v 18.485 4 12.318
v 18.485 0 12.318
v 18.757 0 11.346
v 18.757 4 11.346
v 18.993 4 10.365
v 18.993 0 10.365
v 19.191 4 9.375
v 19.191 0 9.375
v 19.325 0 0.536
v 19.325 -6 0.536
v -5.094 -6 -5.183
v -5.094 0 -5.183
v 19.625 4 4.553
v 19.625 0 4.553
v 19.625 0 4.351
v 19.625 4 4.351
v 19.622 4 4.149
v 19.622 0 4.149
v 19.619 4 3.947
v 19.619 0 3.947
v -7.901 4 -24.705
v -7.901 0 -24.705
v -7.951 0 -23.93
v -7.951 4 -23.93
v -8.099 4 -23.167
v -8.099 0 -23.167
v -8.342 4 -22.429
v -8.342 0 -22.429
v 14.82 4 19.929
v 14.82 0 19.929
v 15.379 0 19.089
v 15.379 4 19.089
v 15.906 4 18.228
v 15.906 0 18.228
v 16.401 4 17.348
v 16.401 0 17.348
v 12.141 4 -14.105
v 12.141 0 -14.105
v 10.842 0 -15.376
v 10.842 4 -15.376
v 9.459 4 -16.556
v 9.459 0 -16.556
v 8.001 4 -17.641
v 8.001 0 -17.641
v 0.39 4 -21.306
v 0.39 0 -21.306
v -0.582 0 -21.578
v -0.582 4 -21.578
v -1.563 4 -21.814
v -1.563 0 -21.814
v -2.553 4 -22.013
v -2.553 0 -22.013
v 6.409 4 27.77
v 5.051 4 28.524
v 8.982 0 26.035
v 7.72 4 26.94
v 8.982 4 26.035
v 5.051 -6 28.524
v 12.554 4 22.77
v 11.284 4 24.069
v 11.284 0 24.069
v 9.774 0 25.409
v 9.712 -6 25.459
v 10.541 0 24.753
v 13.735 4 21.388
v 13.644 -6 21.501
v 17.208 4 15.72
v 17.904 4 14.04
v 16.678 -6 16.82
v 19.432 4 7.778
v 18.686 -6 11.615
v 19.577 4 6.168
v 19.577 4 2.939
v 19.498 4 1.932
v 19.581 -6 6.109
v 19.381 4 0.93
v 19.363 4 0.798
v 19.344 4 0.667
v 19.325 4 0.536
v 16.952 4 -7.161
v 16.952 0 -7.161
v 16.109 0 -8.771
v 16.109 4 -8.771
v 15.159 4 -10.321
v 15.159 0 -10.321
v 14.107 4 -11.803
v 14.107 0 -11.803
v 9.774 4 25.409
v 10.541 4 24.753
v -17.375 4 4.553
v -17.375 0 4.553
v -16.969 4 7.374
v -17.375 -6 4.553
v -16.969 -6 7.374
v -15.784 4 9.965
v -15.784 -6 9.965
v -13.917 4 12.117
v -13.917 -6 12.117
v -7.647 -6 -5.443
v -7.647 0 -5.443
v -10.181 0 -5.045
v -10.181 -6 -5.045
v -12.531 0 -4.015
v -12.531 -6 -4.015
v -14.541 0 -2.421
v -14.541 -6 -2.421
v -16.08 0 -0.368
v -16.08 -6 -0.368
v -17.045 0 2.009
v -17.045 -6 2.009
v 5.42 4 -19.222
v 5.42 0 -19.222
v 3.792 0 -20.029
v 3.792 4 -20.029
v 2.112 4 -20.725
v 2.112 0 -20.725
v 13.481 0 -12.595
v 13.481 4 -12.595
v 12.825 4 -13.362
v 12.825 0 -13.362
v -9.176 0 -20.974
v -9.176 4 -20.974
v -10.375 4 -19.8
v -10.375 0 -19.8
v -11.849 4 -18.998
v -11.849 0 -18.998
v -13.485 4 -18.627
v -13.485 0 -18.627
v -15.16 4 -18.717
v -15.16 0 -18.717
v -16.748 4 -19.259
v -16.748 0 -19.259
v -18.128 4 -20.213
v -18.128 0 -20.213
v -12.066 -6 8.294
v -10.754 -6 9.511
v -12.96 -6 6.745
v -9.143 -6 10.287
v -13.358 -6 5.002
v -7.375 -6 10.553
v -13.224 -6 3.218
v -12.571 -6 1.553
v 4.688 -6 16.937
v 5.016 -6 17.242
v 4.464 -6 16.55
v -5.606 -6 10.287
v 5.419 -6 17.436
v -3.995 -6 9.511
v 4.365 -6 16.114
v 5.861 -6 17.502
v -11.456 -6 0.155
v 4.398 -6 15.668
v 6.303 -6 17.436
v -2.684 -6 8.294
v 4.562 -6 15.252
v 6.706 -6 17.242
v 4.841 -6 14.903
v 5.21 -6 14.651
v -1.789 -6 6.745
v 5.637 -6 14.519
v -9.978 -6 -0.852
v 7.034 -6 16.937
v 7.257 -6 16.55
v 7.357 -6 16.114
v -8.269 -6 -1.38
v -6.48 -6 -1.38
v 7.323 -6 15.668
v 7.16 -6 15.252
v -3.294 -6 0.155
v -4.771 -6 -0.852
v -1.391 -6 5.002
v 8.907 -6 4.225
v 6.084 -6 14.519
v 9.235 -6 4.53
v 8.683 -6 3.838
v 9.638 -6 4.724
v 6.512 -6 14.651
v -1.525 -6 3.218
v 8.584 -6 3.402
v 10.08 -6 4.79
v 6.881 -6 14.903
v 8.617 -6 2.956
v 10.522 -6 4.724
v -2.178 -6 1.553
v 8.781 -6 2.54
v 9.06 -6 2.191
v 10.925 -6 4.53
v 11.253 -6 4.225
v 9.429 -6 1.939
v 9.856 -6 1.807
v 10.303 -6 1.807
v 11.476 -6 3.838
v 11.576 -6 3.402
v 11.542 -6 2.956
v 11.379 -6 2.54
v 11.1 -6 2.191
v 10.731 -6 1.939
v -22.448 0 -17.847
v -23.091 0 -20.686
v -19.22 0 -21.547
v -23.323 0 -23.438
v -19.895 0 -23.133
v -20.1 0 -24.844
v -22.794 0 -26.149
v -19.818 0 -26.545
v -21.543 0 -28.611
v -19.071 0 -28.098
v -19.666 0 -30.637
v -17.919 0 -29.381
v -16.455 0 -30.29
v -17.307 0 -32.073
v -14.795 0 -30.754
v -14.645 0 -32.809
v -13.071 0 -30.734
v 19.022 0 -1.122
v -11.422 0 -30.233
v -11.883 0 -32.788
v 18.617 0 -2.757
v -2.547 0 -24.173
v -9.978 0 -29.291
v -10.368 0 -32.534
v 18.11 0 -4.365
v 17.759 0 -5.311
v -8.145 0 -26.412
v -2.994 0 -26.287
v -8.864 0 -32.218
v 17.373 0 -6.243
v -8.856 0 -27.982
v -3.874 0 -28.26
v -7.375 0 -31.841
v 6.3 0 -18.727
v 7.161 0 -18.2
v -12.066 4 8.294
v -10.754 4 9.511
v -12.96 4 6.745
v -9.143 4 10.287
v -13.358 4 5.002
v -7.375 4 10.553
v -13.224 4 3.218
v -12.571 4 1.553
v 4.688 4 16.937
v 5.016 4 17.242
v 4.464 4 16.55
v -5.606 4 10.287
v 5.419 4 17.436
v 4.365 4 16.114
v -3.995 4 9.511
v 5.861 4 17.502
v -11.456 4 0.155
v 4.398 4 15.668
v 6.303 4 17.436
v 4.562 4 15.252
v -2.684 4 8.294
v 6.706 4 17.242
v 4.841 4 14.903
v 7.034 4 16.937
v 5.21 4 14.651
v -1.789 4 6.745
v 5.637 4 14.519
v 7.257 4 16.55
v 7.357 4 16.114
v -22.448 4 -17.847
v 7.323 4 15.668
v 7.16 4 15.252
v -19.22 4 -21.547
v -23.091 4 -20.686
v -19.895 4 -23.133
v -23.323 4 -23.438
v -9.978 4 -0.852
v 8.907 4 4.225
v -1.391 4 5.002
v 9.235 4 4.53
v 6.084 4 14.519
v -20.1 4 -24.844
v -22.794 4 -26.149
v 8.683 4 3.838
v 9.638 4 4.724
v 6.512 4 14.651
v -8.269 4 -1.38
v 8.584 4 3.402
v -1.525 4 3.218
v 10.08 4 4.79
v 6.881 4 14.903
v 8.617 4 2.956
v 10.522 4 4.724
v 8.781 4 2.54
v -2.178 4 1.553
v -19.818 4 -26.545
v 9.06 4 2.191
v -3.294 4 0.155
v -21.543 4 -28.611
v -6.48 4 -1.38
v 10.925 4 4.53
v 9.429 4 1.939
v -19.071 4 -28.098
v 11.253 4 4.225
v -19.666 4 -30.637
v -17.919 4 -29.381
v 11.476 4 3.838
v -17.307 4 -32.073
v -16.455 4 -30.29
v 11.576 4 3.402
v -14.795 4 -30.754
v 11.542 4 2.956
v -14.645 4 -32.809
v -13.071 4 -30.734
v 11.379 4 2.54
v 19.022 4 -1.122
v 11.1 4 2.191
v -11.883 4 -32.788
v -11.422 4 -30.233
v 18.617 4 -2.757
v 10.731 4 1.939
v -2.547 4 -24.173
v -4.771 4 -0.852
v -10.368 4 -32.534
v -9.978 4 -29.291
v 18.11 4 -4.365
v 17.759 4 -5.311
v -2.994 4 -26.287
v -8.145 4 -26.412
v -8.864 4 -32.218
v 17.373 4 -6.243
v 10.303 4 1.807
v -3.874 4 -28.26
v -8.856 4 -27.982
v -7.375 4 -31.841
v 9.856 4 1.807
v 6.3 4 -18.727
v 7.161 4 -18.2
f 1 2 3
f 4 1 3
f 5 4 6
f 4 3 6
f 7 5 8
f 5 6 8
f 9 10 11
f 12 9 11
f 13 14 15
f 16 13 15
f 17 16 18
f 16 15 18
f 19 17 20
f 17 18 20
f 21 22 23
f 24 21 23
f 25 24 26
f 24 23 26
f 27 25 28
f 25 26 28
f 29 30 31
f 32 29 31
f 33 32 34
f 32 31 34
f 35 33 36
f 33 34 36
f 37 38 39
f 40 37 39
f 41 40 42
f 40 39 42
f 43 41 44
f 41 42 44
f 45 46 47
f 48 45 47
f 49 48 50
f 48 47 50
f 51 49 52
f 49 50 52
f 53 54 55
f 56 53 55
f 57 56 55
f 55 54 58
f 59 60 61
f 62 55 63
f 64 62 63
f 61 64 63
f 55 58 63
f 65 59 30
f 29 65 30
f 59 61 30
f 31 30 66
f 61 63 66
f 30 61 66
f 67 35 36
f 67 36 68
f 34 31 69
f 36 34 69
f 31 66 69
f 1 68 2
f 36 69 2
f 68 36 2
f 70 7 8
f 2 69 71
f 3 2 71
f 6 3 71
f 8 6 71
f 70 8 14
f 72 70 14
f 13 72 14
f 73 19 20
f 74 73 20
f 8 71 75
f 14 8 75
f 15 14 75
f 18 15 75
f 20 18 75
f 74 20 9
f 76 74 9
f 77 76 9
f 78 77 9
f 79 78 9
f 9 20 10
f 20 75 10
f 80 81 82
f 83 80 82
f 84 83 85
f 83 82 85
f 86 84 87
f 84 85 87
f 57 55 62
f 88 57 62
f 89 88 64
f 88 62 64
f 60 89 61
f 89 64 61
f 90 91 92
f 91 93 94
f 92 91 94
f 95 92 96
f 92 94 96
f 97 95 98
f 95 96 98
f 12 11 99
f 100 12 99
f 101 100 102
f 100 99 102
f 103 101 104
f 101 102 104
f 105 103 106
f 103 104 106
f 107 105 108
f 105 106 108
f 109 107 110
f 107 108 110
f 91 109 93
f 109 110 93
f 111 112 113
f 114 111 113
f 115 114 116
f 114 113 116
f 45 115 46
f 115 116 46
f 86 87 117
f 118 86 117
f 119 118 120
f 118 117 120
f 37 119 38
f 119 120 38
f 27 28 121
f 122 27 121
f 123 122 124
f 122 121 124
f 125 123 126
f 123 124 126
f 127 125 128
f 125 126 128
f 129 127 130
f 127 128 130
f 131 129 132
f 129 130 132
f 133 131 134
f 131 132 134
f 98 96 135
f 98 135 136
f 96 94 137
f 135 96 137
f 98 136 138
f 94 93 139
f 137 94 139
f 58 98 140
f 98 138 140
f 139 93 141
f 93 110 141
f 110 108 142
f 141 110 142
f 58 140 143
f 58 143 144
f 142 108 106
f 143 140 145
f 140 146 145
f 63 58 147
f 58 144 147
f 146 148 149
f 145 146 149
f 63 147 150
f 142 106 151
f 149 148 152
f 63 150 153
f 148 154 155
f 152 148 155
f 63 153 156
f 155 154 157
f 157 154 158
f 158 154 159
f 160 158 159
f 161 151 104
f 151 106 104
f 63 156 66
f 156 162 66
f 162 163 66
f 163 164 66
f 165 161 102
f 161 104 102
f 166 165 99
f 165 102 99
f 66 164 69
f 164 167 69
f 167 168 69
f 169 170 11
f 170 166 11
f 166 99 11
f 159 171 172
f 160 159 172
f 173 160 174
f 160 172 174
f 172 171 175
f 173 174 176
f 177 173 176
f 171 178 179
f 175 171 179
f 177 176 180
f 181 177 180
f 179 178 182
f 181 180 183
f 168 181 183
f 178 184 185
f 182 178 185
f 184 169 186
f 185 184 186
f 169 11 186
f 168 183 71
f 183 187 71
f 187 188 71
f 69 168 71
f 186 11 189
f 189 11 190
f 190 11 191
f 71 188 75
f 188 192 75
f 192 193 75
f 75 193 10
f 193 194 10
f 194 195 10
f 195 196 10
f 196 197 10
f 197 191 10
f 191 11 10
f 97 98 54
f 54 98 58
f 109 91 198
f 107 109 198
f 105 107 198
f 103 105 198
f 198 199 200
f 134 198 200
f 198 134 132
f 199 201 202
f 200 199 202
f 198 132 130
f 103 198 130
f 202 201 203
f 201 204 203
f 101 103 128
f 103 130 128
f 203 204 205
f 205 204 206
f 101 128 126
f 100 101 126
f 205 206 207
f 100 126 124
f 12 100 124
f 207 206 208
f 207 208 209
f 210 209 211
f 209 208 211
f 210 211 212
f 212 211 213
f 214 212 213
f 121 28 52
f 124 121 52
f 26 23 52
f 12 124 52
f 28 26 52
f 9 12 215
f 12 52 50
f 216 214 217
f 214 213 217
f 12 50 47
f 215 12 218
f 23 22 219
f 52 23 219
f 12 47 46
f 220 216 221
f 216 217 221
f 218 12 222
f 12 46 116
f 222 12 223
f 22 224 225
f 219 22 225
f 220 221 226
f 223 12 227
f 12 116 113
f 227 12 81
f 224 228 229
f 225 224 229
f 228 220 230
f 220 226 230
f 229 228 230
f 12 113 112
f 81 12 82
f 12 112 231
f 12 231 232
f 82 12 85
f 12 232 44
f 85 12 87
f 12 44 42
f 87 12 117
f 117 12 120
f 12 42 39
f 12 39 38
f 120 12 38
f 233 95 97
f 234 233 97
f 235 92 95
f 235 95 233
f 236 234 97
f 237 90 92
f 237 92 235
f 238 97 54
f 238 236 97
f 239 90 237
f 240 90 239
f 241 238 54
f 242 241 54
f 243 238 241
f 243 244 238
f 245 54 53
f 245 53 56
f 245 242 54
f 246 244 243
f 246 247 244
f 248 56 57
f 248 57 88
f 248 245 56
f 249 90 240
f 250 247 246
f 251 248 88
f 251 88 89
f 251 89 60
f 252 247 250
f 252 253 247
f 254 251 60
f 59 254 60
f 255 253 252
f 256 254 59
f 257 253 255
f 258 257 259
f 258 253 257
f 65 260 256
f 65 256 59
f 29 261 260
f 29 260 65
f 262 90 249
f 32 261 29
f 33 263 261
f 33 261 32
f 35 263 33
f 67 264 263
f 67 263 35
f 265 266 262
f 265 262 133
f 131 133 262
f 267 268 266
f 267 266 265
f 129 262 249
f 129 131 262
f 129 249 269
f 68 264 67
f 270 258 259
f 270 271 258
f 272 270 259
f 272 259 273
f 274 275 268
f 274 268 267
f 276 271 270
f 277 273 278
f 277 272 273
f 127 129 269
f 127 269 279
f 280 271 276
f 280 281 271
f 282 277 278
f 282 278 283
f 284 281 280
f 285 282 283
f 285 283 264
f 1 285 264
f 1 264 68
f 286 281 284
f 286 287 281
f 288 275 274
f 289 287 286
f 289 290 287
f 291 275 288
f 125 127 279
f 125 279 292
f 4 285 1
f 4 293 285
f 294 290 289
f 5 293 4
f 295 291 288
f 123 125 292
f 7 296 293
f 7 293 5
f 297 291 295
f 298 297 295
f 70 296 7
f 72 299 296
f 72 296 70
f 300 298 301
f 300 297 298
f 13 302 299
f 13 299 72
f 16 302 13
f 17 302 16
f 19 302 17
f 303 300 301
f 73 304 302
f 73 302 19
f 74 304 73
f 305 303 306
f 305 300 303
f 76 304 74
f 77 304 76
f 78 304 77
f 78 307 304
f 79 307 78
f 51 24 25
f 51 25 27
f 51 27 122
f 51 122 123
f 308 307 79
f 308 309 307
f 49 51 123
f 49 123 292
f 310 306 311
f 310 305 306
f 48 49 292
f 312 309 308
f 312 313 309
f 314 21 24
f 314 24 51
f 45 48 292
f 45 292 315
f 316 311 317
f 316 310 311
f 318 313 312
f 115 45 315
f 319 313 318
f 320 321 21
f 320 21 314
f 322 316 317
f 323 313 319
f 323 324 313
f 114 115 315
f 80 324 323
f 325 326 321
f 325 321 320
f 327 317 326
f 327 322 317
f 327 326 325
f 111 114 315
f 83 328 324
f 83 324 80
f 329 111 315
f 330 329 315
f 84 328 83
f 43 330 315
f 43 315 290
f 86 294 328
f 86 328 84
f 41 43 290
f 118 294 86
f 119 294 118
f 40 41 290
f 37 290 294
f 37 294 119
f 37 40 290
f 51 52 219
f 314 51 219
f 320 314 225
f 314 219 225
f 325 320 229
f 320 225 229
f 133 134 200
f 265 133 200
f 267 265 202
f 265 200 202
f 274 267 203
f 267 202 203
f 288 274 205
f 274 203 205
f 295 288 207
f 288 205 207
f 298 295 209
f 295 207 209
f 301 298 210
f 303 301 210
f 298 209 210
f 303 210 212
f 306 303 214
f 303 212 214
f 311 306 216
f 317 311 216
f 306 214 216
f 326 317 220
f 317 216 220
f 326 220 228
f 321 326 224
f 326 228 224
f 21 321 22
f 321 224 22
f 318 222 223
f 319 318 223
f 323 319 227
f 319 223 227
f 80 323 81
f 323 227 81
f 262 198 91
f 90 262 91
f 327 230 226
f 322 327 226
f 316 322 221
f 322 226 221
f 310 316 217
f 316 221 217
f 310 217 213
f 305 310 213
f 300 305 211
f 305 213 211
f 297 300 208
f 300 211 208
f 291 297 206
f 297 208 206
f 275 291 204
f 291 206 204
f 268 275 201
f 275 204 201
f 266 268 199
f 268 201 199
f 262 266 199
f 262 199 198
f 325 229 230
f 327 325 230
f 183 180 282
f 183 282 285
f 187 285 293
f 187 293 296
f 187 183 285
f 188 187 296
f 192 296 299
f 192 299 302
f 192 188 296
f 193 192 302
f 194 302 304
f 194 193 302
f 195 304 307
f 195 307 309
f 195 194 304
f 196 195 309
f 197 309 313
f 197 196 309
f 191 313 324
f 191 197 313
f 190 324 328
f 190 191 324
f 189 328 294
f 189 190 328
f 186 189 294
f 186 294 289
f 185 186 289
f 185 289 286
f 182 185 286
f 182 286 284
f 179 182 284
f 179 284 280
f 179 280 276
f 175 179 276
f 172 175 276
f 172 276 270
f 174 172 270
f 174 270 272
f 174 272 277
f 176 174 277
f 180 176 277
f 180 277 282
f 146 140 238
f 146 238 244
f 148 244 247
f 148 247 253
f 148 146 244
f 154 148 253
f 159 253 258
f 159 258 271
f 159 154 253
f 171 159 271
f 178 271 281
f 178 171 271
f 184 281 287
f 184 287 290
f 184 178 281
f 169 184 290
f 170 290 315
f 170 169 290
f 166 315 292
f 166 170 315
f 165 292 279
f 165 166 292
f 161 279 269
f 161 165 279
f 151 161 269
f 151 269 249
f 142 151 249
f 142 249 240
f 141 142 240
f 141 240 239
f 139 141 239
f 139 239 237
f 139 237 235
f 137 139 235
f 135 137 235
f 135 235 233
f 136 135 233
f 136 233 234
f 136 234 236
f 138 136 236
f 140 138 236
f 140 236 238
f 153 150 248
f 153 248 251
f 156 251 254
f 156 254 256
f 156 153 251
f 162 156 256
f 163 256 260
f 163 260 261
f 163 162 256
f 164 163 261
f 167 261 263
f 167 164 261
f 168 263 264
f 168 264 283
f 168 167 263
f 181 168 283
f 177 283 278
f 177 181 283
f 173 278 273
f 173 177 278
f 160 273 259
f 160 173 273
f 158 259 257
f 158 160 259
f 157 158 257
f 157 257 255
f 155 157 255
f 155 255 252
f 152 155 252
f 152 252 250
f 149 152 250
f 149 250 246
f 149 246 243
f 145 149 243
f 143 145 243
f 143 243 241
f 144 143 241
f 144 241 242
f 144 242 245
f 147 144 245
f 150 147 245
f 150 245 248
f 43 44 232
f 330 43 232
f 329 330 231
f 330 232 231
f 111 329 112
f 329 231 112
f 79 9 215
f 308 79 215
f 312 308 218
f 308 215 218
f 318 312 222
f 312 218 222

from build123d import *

# Parameters (mm, degrees)
SKETCH_1_R      = 6
SKETCH_1_R_2    = 1.5
EXTRUDE_1_DEPTH = 4
EXTRUDE_START   = -10
SKETCH_2_R      = 6
SKETCH_2_R_2    = 1.5
EXTRUDE_3_DEPTH = 10


with BuildPart() as part:
    # 草图1 → 凸台-拉伸1 (new body)
    # profile 1 of 2: a face of its own
    with BuildSketch(Plane(origin=(0, 0, 0), x_dir=(1, 0, 0), z_dir=(0, 1, 0))):
        with BuildLine():
            ThreePointArc((-11.882996945, 32.788243467), (-20.67500257, 29.68936306), (-23.090953179, 20.685719055))
            Line((-23.090953179, 20.685719055), (-22.448063756, 17.847212503))
            ThreePointArc((-22.448063756, 17.847212503), (-20.341934216, 19.128766183), (-18.127687059, 20.212865348))
            ThreePointArc((-18.127687059, 20.212865348), (-16.454907522, 30.290305128), (-7.901384252, 24.70548431))
            ThreePointArc((-7.901384252, 24.70548431), (-8.01255227, 23.54622097), (-8.342004413, 22.429211075))
            ThreePointArc((-8.342004413, 22.429211075), (-5.436219765, 22.37688115), (-2.552893168, 22.012531633))
            ThreePointArc((-2.552893168, 22.012531633), (-2.714933584, 25.241816969), (-3.873838396, 28.260339871))
            Line((-3.873838396, 28.260339871), (-7.3745684, 31.841047256))
            ThreePointArc((-7.3745684, 31.841047256), (-9.61431765, 32.383495426), (-11.882996945, 32.788243467))
        make_face()
    # profile 2 of 2: a face of its own
    with BuildSketch(Plane(origin=(0, 0, 0), x_dir=(1, 0, 0), z_dir=(0, 1, 0))):
        with BuildLine():
            ThreePointArc((-18.127687059, 20.212865348), (-20.341934216, 19.128766183), (-22.448063756, 17.847212503))
            Line((-22.448063756, 17.847212503), (-17.3745684, -4.553451276))
            ThreePointArc((-17.3745684, -4.553451276), (-16.46911872, -8.71147418), (-13.916737505, -12.116520983))
            Line((-13.916737505, -12.116520983), (5.051344821, -28.524197627))
            ThreePointArc((5.051344821, -28.524197627), (7.070533196, -27.364392508), (8.982279547, -26.034920622))
            ThreePointArc((8.982279547, -26.034920622), (10.160528905, -25.084412347), (11.283653654, -24.069361447))
            ThreePointArc((11.283653654, -24.069361447), (13.156392672, -22.088548581), (14.819857518, -19.928998687))
            ThreePointArc((14.819857518, -19.928998687), (15.646716038, -18.660912524), (16.40120317, -17.348477117))
            ThreePointArc((16.40120317, -17.348477117), (17.570178978, -14.88590395), (18.484890443, -12.318011044))
            ThreePointArc((18.484890443, -12.318011044), (18.879419451, -10.8564761), (19.19141451, -9.375126508))
            ThreePointArc((19.19141451, -9.375126508), (19.516708425, -6.974036065), (19.6254316, -4.553451276))
            ThreePointArc((19.6254316, -4.553451276), (19.623728487, -4.250193605), (19.618619362, -3.946974192))
            ThreePointArc((19.618619362, -3.946974192), (19.542199611, -2.435055692), (19.381162346, -0.929796734))
            ThreePointArc((19.381162346, -0.929796734), (18.879419451, 1.749573548), (18.110066991, 4.364696458))
            ThreePointArc((18.110066991, 4.364696458), (17.570178978, 5.779001398), (16.951872839, 7.160824487))
            ThreePointArc((16.951872839, 7.160824487), (15.646716038, 9.554009971), (14.106900946, 11.80339667))
            ThreePointArc((14.106900946, 11.80339667), (13.156392672, 12.981646029), (12.141341771, 14.104770777))
            ThreePointArc((12.141341771, 14.104770777), (10.160528905, 15.977509795), (8.000979011, 17.640974641))
            ThreePointArc((8.000979011, 17.640974641), (6.732892848, 18.467833161), (5.420457441, 19.222320294))
            ThreePointArc((5.420457441, 19.222320294), (2.957884274, 20.391296102), (0.389991368, 21.306007566))
            ThreePointArc((0.389991368, 21.306007566), (-1.071543576, 21.700536575), (-2.552893168, 22.012531633))
            ThreePointArc((-2.552893168, 22.012531633), (-5.436219765, 22.37688115), (-8.342004413, 22.429211075))
            ThreePointArc((-8.342004413, 22.429211075), (-12.653931695, 18.756167408), (-18.127687059, 20.212865348))
        make_face()
        with Locations(Location((-7.3745684, -4.553451276, 0), (0, 0, 270))):
            Circle(SKETCH_1_R, mode=Mode.SUBTRACT)
        with Locations(Location((5.860803588, -16.002247211, 0), (0, 0, 270))):
            Circle(SKETCH_1_R_2, mode=Mode.SUBTRACT)
        with Locations(Location((10.079774126, -3.290151234, 0), (0, 0, 270))):
            Circle(SKETCH_1_R_2, mode=Mode.SUBTRACT)
    extrude(amount=EXTRUDE_1_DEPTH)

    # 草图2 → 凸台-拉伸3 (add)
    # profile 1 of 2: a face of its own
    with BuildSketch(Plane(origin=(0, 4, 0), x_dir=(1, 0, 0), z_dir=(0, 1, 0)).offset(EXTRUDE_START)):
        with BuildLine():
            ThreePointArc((2.6254316, -4.553451276), (0.461357134, 1.659299405), (-5.094222606, 5.183079064))
            ThreePointArc((-5.094222606, 5.183079064), (-13.587319081, 3.282474258), (-17.3745684, -4.553451276))
            ThreePointArc((-17.3745684, -4.553451276), (-16.46911872, -8.71147418), (-13.916737505, -12.116520983))
            ThreePointArc((-13.916737505, -12.116520983), (-3.216545495, -13.648001596), (2.6254316, -4.553451276))
        make_face()
        with Locations(Location((-7.3745684, -4.553451276, 0), (0, 0, 270))):
            Circle(SKETCH_2_R, mode=Mode.SUBTRACT)
    # profile 2 of 2: a face of its own
    with BuildSketch(Plane(origin=(0, 4, 0), x_dir=(1, 0, 0), z_dir=(0, 1, 0)).offset(EXTRUDE_START)):
        with BuildLine():
            Line((19.324871256, -0.535999093), (-5.094222606, 5.183079064))
            ThreePointArc((-5.094222606, 5.183079064), (0.461357134, 1.659299405), (2.6254316, -4.553451276))
            ThreePointArc((2.6254316, -4.553451276), (-3.216545495, -13.648001596), (-13.916737505, -12.116520983))
            Line((-13.916737505, -12.116520983), (5.051344821, -28.524197627))
            ThreePointArc((5.051344821, -28.524197627), (16.678147117, -16.819945325), (19.324871256, -0.535999093))
        make_face()
        with Locations(Location((5.860803588, -16.002247211, 0), (0, 0, 270))):
            Circle(SKETCH_2_R_2, mode=Mode.SUBTRACT)
        with Locations(Location((10.079774126, -3.290151234, 0), (0, 0, 270))):
            Circle(SKETCH_2_R_2, mode=Mode.SUBTRACT)
    extrude(amount=EXTRUDE_3_DEPTH)


solid = part.part
